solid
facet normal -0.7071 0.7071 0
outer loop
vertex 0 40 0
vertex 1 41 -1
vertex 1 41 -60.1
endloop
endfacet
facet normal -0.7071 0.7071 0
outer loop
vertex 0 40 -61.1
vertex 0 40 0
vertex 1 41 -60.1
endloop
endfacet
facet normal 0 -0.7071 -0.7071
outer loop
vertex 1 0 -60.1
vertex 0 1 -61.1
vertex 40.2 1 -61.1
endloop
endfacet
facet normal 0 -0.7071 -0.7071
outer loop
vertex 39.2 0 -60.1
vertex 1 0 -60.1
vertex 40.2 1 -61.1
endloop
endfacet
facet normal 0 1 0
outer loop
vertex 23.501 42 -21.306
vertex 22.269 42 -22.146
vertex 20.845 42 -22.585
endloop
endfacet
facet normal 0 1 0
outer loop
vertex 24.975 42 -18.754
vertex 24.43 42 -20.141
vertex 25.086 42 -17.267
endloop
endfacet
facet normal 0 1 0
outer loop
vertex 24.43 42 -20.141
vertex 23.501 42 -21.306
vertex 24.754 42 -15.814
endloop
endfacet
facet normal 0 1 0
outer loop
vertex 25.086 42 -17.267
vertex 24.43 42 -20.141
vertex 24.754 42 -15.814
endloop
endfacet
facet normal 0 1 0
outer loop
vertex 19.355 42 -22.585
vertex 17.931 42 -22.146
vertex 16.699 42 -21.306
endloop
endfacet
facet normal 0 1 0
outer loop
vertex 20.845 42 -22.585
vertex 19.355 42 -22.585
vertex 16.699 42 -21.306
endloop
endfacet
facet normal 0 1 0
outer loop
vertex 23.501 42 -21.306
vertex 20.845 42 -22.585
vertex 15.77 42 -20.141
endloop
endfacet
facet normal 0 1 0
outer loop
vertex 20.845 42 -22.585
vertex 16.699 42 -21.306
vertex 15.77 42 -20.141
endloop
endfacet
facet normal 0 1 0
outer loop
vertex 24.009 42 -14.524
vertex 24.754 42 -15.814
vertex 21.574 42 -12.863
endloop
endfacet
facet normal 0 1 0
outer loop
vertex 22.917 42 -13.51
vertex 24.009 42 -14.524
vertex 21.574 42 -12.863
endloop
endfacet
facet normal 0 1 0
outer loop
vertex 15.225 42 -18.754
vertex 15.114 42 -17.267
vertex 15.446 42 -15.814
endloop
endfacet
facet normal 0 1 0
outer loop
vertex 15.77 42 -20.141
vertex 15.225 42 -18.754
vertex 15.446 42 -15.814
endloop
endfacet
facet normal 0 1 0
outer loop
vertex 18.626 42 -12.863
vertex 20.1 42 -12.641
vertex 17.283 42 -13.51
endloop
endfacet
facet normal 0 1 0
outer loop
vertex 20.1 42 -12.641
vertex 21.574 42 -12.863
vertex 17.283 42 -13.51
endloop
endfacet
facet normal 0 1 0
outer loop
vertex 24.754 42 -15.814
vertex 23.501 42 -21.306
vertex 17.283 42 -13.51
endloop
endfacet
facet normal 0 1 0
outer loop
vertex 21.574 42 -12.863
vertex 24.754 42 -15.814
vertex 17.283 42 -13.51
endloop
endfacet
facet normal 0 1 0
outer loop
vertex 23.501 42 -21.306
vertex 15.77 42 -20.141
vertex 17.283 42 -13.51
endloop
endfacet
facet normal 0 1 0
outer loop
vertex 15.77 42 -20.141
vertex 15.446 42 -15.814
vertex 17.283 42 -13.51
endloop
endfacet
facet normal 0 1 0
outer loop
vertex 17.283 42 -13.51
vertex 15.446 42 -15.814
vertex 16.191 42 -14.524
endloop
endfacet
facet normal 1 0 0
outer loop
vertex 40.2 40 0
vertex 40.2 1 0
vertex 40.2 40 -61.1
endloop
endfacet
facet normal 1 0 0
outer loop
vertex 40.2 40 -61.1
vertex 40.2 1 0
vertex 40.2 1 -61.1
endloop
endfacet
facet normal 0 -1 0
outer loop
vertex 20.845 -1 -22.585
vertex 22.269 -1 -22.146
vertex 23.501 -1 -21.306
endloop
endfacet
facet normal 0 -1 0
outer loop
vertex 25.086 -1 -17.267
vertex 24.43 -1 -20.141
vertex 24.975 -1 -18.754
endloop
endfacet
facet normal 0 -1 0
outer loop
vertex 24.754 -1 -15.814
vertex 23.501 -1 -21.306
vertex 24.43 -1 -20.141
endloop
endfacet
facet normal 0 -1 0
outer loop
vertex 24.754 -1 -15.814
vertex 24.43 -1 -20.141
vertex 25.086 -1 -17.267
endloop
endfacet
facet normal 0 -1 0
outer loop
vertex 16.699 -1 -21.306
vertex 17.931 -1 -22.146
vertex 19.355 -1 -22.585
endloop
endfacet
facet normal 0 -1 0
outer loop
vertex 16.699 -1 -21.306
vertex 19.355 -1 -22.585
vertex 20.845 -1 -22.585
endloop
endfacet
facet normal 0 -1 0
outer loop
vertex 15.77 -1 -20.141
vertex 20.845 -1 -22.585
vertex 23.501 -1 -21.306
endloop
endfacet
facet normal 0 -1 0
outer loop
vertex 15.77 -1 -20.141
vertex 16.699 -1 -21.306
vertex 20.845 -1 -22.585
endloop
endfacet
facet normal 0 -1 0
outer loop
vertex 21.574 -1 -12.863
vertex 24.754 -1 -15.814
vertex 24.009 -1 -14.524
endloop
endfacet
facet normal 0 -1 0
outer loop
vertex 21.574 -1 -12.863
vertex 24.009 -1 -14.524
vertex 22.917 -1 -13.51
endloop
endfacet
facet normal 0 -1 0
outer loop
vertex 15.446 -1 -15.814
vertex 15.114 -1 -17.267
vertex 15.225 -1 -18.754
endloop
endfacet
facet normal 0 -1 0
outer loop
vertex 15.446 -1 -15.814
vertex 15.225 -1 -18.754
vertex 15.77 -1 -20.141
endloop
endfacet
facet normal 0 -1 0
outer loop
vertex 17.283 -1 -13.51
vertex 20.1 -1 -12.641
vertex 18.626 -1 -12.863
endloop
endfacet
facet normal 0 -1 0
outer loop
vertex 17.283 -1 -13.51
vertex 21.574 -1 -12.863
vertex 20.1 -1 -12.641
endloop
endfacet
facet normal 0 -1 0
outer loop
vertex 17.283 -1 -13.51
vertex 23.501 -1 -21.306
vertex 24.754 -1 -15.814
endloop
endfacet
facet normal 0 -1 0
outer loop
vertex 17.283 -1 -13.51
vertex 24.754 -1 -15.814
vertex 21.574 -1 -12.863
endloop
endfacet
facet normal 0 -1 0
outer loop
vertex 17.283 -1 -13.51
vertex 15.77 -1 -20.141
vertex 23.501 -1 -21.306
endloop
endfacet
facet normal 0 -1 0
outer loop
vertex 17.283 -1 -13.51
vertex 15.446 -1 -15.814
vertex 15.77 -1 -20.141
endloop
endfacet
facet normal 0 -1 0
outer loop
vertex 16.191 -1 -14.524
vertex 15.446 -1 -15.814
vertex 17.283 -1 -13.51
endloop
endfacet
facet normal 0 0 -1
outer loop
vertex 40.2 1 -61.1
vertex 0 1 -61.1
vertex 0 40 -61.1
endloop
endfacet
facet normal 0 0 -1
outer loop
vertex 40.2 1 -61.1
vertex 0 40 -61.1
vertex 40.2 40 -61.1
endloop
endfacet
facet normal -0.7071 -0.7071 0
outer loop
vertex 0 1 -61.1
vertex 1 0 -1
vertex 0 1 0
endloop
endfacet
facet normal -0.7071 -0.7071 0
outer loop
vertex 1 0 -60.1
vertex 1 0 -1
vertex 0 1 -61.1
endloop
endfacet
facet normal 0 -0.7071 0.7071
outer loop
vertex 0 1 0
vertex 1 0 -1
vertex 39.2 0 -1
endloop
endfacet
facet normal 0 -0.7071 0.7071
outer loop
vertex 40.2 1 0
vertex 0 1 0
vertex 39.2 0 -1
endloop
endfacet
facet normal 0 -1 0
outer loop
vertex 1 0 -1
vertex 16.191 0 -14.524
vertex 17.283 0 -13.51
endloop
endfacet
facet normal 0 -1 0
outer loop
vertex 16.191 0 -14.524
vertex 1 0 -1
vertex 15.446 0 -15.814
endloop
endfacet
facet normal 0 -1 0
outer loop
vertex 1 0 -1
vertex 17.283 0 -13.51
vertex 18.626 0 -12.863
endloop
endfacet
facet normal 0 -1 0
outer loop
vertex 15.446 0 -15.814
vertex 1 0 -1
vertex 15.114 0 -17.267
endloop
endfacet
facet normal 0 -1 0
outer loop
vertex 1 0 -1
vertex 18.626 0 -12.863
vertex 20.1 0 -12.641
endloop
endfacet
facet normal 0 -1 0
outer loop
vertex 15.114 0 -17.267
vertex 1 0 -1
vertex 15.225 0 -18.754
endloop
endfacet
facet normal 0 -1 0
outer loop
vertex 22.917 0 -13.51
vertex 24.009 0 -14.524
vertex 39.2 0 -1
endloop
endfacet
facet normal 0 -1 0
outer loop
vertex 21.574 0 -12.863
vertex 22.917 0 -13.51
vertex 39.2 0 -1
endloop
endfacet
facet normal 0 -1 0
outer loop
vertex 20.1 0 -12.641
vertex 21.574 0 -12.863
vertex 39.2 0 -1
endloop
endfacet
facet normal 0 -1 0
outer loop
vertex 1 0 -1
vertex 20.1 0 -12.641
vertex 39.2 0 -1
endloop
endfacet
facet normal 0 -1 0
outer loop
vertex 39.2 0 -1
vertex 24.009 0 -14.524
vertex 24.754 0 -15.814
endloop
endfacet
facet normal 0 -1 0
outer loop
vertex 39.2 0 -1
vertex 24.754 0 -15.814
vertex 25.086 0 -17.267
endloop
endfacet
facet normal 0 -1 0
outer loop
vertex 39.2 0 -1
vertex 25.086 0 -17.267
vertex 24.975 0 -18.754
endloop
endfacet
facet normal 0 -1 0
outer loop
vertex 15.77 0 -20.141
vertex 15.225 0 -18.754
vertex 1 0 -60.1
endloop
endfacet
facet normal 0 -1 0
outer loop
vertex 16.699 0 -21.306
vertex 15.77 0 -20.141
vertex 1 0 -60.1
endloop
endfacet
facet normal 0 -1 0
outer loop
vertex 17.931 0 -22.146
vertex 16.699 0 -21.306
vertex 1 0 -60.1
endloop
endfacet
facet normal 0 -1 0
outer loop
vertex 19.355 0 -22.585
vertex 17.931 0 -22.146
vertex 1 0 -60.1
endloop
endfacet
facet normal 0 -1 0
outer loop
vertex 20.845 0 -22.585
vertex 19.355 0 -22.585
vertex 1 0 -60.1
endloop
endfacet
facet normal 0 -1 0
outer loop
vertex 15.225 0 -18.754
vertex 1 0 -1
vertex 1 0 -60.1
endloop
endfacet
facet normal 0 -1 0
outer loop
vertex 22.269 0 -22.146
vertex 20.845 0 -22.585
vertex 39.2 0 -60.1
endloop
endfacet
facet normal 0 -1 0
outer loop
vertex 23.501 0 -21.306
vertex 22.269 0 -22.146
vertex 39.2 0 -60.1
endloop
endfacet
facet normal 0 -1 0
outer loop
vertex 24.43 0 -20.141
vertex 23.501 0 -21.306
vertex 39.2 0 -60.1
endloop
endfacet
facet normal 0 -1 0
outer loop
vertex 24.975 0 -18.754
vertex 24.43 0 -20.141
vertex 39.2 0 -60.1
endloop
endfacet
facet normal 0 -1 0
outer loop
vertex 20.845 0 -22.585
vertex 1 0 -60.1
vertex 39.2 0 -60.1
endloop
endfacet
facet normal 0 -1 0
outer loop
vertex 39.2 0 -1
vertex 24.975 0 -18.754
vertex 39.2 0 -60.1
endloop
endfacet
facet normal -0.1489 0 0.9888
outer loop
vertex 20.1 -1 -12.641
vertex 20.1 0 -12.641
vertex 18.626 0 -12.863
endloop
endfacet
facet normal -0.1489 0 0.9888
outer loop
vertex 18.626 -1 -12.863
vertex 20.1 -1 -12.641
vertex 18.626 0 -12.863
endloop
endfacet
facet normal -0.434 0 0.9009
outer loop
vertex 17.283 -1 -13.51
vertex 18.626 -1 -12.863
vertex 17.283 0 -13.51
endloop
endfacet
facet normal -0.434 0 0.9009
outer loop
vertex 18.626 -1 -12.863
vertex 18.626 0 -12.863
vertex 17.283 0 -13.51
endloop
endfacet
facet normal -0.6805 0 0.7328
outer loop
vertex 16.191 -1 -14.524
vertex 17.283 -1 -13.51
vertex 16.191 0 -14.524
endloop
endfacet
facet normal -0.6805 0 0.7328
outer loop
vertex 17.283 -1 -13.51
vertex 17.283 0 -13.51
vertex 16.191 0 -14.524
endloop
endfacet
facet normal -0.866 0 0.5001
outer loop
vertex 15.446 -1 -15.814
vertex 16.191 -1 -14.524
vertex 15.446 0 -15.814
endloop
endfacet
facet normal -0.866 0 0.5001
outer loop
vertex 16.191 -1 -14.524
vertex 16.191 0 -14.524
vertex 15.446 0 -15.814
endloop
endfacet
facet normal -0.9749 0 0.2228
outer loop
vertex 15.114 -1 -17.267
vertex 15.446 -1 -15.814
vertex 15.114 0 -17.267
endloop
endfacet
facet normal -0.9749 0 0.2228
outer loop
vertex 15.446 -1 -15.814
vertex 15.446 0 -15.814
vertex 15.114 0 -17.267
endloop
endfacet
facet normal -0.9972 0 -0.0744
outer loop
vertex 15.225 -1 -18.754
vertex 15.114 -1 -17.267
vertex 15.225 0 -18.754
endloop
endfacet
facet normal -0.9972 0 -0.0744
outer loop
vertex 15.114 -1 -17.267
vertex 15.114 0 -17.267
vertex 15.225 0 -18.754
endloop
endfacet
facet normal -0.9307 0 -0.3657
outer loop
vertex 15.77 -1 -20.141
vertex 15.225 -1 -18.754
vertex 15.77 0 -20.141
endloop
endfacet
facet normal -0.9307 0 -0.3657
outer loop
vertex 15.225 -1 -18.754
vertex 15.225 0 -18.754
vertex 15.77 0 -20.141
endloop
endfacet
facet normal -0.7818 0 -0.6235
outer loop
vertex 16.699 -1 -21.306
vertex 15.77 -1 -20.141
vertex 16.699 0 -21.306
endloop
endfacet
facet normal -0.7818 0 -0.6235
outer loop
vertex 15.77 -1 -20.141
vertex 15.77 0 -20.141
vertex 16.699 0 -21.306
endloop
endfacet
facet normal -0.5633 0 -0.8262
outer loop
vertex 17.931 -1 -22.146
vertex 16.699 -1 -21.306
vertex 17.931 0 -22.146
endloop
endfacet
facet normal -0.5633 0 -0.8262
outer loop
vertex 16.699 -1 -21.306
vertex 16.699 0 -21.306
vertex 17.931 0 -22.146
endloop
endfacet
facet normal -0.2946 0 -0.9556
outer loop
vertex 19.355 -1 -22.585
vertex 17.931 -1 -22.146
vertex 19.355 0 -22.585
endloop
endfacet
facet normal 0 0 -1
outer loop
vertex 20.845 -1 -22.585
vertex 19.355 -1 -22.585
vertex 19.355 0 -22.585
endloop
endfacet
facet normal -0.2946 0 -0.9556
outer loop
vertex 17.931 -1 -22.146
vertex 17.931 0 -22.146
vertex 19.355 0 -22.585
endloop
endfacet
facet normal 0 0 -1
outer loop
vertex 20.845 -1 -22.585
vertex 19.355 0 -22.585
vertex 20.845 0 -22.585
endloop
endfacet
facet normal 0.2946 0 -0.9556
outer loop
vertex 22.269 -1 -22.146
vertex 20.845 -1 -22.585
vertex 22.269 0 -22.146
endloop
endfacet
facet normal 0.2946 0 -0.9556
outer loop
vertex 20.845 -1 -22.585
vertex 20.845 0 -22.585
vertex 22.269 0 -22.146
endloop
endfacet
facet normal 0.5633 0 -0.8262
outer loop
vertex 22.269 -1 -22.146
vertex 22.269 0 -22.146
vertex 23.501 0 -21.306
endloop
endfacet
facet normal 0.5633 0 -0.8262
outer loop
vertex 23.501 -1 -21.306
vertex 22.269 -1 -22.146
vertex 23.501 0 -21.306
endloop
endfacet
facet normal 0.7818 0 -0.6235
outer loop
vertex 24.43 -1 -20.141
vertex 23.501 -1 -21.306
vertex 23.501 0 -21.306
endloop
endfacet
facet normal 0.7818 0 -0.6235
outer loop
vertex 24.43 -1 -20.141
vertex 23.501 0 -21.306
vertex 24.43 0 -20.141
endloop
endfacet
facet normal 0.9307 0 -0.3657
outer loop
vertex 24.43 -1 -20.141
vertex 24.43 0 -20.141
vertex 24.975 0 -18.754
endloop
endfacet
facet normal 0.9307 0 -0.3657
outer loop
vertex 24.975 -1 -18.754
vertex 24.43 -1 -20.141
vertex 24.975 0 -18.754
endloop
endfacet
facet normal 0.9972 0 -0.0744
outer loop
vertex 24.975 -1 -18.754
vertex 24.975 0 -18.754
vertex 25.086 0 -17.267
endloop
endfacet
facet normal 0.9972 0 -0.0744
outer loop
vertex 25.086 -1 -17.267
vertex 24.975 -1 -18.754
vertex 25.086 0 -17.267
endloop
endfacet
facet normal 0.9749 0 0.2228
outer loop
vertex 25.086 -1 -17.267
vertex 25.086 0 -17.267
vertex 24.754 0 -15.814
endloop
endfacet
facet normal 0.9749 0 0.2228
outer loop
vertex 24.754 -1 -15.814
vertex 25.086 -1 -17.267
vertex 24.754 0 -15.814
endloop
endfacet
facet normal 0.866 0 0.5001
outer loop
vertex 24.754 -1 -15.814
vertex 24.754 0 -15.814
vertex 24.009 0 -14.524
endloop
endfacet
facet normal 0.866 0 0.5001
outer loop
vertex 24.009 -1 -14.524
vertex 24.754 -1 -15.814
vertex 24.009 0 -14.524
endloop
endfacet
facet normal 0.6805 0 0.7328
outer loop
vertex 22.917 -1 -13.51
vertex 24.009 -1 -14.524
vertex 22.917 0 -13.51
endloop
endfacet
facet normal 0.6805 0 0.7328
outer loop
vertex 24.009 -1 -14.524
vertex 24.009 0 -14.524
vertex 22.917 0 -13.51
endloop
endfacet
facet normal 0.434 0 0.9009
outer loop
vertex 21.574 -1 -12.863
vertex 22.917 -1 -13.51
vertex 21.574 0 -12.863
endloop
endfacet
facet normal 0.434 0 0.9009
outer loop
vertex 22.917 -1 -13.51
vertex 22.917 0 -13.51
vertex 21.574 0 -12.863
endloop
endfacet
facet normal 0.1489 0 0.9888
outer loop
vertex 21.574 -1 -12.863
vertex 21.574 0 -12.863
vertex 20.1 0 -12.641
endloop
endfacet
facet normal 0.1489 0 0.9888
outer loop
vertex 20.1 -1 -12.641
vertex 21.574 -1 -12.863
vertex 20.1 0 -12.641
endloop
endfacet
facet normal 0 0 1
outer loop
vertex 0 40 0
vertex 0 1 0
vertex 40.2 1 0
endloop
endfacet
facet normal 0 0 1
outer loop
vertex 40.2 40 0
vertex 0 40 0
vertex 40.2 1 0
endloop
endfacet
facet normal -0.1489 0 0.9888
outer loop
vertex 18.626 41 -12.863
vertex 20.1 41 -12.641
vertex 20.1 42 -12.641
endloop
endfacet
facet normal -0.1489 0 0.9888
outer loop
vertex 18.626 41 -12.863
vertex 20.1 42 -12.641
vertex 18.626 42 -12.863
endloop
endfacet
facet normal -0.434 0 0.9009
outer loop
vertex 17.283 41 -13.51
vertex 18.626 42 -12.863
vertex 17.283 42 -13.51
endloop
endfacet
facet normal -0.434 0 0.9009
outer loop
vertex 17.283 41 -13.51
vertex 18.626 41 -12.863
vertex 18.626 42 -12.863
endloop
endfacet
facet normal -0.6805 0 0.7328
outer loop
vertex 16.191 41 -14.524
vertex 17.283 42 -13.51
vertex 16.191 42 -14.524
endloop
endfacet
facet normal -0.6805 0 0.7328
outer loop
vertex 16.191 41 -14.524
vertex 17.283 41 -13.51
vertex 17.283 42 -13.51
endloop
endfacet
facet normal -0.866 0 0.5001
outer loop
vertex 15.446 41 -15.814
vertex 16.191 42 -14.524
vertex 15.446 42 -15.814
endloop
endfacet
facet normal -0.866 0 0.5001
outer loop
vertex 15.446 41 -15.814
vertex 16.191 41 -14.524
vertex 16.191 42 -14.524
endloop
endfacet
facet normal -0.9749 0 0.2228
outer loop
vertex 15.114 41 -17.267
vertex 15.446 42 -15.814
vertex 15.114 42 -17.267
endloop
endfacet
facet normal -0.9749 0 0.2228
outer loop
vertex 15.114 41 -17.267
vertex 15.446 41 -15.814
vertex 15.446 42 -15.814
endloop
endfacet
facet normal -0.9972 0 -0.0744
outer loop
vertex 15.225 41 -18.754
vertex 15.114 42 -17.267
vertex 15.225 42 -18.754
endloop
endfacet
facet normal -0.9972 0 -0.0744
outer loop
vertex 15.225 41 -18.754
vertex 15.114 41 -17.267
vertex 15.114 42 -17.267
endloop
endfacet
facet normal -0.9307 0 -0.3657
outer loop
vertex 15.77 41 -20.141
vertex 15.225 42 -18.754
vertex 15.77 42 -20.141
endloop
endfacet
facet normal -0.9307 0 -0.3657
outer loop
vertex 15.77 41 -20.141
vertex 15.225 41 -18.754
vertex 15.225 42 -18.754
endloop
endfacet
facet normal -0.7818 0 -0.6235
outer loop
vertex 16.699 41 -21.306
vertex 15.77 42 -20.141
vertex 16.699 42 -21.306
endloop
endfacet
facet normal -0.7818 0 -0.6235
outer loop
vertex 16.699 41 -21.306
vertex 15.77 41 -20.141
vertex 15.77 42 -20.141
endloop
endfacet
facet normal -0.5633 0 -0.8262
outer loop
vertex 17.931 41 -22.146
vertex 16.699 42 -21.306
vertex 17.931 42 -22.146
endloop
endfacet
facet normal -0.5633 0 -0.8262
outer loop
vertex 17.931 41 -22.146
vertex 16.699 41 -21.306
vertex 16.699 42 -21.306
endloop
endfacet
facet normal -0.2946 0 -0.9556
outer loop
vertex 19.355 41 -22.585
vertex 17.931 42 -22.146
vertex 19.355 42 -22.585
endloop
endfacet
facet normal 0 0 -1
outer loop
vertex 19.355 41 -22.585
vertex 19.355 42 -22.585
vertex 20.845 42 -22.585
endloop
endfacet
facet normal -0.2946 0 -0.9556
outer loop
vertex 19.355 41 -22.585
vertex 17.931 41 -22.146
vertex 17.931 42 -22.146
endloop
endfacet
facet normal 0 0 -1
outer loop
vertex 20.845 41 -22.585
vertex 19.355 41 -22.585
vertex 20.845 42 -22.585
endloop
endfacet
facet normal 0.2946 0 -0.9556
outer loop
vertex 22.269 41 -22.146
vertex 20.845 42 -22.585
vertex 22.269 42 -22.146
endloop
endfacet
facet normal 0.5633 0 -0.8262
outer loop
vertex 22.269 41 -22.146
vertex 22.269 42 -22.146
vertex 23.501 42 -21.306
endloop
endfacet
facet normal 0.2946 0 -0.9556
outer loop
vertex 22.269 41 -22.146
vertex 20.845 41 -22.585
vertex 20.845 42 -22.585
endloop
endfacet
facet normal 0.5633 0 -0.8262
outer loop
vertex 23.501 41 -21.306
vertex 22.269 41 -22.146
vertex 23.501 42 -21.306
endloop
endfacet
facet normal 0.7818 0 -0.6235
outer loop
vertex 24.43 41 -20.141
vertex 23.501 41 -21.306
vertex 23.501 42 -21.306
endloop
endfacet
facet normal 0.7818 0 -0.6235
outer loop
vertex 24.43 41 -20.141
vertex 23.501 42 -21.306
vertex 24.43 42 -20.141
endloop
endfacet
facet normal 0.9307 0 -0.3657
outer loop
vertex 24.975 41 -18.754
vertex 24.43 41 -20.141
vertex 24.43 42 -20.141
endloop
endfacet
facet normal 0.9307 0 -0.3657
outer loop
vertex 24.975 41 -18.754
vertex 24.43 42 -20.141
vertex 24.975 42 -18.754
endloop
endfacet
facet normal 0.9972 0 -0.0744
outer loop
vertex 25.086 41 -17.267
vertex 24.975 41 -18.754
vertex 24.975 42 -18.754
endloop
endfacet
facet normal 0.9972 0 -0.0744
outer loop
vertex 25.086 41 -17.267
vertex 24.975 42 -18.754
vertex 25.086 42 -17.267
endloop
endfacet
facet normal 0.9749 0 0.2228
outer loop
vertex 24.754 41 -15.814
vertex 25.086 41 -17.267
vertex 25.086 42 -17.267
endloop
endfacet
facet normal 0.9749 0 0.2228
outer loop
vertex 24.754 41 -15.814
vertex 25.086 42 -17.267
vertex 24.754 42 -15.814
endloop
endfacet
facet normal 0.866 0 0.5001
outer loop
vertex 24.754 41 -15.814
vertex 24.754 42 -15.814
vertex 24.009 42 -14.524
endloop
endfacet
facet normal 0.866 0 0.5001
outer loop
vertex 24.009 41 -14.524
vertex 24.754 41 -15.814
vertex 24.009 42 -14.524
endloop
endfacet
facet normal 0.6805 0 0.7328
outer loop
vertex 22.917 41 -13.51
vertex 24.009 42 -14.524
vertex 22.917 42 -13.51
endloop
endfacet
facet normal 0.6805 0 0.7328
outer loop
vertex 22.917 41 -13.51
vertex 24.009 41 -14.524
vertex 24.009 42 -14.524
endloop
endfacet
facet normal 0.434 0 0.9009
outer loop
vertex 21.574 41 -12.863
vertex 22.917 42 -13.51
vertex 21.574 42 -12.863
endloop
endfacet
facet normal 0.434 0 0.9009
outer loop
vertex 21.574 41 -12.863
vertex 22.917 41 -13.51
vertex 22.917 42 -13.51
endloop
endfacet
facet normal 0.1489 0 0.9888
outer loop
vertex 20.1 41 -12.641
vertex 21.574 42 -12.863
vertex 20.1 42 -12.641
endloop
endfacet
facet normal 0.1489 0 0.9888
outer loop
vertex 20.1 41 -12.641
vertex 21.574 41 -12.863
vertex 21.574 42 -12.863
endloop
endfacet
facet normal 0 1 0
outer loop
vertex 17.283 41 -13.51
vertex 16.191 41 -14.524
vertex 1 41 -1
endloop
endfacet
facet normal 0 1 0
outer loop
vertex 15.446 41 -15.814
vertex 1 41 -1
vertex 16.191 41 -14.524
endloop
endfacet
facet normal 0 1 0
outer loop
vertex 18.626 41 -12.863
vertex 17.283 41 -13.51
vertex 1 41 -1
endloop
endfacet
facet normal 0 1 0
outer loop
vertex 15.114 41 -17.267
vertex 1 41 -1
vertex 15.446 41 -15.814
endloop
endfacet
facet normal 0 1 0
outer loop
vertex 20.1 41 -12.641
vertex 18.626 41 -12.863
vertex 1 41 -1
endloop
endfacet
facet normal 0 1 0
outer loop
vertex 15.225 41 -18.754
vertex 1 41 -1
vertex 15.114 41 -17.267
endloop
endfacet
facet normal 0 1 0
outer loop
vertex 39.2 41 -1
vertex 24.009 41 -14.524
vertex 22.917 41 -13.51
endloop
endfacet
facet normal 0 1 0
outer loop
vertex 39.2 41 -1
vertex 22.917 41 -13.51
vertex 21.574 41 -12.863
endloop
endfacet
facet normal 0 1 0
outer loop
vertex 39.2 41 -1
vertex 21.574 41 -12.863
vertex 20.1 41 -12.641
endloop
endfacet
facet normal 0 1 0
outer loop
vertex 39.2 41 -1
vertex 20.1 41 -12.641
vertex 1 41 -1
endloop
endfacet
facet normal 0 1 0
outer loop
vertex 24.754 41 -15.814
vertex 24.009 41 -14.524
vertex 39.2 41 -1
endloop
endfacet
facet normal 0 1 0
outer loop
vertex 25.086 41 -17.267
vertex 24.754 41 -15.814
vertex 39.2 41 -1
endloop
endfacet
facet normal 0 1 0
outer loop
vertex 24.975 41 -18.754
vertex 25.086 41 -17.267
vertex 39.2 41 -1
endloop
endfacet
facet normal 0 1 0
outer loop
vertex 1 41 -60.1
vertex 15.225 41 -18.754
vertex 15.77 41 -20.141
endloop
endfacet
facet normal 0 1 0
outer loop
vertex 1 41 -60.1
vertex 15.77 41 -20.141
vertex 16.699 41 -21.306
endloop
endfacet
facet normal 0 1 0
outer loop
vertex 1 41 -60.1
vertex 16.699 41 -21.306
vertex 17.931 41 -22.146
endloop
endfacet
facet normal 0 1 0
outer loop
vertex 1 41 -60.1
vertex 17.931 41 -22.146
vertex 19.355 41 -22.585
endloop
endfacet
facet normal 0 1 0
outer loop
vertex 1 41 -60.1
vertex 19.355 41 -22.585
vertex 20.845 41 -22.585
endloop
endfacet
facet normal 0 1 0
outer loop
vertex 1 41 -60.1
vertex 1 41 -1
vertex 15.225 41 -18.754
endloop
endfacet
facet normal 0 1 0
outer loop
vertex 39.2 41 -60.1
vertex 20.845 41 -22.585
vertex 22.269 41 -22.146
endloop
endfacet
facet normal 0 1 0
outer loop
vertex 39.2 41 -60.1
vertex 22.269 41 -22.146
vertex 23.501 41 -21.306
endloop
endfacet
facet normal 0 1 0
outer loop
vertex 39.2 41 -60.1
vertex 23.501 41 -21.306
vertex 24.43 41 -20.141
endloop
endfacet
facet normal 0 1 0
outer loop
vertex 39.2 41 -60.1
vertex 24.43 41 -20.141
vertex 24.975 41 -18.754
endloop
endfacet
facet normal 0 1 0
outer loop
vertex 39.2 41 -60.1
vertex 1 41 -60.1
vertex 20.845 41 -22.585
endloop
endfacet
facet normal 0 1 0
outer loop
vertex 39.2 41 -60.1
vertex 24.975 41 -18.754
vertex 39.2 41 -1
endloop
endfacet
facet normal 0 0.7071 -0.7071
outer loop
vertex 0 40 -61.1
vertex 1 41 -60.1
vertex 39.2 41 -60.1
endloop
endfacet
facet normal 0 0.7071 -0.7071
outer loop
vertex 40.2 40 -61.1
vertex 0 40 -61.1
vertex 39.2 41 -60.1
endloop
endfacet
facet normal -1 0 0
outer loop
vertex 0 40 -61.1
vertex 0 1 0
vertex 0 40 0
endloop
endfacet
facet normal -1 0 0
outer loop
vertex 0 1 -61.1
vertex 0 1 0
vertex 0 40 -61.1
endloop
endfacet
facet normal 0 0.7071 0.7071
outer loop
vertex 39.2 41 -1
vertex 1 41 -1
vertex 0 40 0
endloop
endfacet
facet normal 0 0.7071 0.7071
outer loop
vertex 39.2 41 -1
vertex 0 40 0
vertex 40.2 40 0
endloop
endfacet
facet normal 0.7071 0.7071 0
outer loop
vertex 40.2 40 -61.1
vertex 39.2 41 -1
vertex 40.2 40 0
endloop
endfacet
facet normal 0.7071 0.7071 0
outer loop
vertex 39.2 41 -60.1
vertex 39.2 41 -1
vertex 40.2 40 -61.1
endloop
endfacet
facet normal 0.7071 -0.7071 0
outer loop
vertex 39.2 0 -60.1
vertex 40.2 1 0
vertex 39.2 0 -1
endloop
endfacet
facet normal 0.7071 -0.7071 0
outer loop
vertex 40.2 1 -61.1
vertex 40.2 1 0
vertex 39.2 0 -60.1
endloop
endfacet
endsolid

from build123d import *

# Parameters (mm, degrees)
SKETCH1_W           = 40.2
SKETCH1_H           = 61.1
BOSS_EXTRUDE1_DEPTH = 41
CHAMFER1_SIZE       = 1
CHAMFER2_SIZE       = 1
SKETCH2_R           = 5
BOSS_EXTRUDE2_DEPTH = 1


with BuildPart() as part:
    # Sketch1 → Boss-Extrude1 (new body)
    with BuildSketch(Plane(origin=(0, 0, 0), x_dir=(1, 0, 0), z_dir=(0, 1, 0))):
        with Locations((20.1, 30.55)):
            Rectangle(SKETCH1_W, SKETCH1_H)
    extrude(amount=BOSS_EXTRUDE1_DEPTH)

    # Chamfer1
    chamfer1_edges = [part.edges().sort_by_distance(p)[0] for p in [
        (40.2, 41, -30.55),
        (20.1, 41, -61.1),
        (0, 41, -30.55),
        (20.1, 41, 0),
    ]]
    chamfer(chamfer1_edges, length=CHAMFER1_SIZE)

    # Chamfer2
    chamfer2_edges = [part.edges().sort_by_distance(p)[0] for p in [
        (20.1, 0, -61.1),
        (40.2, 0, -30.55),
        (20.1, 0, 0),
        (0, 0, -30.55),
    ]]
    chamfer(chamfer2_edges, length=CHAMFER2_SIZE)

    # Sketch2 → Boss-Extrude2 (add)
    with BuildSketch(Plane.XZ):
        with Locations(Location((20.1, -17.640972678, 0), (0, 0, 90))):
            Circle(SKETCH2_R)
    boss_extrude2 = extrude(amount=BOSS_EXTRUDE2_DEPTH)

    # Mirror1: Boss-Extrude2 across plane
    add(boss_extrude2.mirror(Plane.ZX.offset(20.5)))


solid = part.part
